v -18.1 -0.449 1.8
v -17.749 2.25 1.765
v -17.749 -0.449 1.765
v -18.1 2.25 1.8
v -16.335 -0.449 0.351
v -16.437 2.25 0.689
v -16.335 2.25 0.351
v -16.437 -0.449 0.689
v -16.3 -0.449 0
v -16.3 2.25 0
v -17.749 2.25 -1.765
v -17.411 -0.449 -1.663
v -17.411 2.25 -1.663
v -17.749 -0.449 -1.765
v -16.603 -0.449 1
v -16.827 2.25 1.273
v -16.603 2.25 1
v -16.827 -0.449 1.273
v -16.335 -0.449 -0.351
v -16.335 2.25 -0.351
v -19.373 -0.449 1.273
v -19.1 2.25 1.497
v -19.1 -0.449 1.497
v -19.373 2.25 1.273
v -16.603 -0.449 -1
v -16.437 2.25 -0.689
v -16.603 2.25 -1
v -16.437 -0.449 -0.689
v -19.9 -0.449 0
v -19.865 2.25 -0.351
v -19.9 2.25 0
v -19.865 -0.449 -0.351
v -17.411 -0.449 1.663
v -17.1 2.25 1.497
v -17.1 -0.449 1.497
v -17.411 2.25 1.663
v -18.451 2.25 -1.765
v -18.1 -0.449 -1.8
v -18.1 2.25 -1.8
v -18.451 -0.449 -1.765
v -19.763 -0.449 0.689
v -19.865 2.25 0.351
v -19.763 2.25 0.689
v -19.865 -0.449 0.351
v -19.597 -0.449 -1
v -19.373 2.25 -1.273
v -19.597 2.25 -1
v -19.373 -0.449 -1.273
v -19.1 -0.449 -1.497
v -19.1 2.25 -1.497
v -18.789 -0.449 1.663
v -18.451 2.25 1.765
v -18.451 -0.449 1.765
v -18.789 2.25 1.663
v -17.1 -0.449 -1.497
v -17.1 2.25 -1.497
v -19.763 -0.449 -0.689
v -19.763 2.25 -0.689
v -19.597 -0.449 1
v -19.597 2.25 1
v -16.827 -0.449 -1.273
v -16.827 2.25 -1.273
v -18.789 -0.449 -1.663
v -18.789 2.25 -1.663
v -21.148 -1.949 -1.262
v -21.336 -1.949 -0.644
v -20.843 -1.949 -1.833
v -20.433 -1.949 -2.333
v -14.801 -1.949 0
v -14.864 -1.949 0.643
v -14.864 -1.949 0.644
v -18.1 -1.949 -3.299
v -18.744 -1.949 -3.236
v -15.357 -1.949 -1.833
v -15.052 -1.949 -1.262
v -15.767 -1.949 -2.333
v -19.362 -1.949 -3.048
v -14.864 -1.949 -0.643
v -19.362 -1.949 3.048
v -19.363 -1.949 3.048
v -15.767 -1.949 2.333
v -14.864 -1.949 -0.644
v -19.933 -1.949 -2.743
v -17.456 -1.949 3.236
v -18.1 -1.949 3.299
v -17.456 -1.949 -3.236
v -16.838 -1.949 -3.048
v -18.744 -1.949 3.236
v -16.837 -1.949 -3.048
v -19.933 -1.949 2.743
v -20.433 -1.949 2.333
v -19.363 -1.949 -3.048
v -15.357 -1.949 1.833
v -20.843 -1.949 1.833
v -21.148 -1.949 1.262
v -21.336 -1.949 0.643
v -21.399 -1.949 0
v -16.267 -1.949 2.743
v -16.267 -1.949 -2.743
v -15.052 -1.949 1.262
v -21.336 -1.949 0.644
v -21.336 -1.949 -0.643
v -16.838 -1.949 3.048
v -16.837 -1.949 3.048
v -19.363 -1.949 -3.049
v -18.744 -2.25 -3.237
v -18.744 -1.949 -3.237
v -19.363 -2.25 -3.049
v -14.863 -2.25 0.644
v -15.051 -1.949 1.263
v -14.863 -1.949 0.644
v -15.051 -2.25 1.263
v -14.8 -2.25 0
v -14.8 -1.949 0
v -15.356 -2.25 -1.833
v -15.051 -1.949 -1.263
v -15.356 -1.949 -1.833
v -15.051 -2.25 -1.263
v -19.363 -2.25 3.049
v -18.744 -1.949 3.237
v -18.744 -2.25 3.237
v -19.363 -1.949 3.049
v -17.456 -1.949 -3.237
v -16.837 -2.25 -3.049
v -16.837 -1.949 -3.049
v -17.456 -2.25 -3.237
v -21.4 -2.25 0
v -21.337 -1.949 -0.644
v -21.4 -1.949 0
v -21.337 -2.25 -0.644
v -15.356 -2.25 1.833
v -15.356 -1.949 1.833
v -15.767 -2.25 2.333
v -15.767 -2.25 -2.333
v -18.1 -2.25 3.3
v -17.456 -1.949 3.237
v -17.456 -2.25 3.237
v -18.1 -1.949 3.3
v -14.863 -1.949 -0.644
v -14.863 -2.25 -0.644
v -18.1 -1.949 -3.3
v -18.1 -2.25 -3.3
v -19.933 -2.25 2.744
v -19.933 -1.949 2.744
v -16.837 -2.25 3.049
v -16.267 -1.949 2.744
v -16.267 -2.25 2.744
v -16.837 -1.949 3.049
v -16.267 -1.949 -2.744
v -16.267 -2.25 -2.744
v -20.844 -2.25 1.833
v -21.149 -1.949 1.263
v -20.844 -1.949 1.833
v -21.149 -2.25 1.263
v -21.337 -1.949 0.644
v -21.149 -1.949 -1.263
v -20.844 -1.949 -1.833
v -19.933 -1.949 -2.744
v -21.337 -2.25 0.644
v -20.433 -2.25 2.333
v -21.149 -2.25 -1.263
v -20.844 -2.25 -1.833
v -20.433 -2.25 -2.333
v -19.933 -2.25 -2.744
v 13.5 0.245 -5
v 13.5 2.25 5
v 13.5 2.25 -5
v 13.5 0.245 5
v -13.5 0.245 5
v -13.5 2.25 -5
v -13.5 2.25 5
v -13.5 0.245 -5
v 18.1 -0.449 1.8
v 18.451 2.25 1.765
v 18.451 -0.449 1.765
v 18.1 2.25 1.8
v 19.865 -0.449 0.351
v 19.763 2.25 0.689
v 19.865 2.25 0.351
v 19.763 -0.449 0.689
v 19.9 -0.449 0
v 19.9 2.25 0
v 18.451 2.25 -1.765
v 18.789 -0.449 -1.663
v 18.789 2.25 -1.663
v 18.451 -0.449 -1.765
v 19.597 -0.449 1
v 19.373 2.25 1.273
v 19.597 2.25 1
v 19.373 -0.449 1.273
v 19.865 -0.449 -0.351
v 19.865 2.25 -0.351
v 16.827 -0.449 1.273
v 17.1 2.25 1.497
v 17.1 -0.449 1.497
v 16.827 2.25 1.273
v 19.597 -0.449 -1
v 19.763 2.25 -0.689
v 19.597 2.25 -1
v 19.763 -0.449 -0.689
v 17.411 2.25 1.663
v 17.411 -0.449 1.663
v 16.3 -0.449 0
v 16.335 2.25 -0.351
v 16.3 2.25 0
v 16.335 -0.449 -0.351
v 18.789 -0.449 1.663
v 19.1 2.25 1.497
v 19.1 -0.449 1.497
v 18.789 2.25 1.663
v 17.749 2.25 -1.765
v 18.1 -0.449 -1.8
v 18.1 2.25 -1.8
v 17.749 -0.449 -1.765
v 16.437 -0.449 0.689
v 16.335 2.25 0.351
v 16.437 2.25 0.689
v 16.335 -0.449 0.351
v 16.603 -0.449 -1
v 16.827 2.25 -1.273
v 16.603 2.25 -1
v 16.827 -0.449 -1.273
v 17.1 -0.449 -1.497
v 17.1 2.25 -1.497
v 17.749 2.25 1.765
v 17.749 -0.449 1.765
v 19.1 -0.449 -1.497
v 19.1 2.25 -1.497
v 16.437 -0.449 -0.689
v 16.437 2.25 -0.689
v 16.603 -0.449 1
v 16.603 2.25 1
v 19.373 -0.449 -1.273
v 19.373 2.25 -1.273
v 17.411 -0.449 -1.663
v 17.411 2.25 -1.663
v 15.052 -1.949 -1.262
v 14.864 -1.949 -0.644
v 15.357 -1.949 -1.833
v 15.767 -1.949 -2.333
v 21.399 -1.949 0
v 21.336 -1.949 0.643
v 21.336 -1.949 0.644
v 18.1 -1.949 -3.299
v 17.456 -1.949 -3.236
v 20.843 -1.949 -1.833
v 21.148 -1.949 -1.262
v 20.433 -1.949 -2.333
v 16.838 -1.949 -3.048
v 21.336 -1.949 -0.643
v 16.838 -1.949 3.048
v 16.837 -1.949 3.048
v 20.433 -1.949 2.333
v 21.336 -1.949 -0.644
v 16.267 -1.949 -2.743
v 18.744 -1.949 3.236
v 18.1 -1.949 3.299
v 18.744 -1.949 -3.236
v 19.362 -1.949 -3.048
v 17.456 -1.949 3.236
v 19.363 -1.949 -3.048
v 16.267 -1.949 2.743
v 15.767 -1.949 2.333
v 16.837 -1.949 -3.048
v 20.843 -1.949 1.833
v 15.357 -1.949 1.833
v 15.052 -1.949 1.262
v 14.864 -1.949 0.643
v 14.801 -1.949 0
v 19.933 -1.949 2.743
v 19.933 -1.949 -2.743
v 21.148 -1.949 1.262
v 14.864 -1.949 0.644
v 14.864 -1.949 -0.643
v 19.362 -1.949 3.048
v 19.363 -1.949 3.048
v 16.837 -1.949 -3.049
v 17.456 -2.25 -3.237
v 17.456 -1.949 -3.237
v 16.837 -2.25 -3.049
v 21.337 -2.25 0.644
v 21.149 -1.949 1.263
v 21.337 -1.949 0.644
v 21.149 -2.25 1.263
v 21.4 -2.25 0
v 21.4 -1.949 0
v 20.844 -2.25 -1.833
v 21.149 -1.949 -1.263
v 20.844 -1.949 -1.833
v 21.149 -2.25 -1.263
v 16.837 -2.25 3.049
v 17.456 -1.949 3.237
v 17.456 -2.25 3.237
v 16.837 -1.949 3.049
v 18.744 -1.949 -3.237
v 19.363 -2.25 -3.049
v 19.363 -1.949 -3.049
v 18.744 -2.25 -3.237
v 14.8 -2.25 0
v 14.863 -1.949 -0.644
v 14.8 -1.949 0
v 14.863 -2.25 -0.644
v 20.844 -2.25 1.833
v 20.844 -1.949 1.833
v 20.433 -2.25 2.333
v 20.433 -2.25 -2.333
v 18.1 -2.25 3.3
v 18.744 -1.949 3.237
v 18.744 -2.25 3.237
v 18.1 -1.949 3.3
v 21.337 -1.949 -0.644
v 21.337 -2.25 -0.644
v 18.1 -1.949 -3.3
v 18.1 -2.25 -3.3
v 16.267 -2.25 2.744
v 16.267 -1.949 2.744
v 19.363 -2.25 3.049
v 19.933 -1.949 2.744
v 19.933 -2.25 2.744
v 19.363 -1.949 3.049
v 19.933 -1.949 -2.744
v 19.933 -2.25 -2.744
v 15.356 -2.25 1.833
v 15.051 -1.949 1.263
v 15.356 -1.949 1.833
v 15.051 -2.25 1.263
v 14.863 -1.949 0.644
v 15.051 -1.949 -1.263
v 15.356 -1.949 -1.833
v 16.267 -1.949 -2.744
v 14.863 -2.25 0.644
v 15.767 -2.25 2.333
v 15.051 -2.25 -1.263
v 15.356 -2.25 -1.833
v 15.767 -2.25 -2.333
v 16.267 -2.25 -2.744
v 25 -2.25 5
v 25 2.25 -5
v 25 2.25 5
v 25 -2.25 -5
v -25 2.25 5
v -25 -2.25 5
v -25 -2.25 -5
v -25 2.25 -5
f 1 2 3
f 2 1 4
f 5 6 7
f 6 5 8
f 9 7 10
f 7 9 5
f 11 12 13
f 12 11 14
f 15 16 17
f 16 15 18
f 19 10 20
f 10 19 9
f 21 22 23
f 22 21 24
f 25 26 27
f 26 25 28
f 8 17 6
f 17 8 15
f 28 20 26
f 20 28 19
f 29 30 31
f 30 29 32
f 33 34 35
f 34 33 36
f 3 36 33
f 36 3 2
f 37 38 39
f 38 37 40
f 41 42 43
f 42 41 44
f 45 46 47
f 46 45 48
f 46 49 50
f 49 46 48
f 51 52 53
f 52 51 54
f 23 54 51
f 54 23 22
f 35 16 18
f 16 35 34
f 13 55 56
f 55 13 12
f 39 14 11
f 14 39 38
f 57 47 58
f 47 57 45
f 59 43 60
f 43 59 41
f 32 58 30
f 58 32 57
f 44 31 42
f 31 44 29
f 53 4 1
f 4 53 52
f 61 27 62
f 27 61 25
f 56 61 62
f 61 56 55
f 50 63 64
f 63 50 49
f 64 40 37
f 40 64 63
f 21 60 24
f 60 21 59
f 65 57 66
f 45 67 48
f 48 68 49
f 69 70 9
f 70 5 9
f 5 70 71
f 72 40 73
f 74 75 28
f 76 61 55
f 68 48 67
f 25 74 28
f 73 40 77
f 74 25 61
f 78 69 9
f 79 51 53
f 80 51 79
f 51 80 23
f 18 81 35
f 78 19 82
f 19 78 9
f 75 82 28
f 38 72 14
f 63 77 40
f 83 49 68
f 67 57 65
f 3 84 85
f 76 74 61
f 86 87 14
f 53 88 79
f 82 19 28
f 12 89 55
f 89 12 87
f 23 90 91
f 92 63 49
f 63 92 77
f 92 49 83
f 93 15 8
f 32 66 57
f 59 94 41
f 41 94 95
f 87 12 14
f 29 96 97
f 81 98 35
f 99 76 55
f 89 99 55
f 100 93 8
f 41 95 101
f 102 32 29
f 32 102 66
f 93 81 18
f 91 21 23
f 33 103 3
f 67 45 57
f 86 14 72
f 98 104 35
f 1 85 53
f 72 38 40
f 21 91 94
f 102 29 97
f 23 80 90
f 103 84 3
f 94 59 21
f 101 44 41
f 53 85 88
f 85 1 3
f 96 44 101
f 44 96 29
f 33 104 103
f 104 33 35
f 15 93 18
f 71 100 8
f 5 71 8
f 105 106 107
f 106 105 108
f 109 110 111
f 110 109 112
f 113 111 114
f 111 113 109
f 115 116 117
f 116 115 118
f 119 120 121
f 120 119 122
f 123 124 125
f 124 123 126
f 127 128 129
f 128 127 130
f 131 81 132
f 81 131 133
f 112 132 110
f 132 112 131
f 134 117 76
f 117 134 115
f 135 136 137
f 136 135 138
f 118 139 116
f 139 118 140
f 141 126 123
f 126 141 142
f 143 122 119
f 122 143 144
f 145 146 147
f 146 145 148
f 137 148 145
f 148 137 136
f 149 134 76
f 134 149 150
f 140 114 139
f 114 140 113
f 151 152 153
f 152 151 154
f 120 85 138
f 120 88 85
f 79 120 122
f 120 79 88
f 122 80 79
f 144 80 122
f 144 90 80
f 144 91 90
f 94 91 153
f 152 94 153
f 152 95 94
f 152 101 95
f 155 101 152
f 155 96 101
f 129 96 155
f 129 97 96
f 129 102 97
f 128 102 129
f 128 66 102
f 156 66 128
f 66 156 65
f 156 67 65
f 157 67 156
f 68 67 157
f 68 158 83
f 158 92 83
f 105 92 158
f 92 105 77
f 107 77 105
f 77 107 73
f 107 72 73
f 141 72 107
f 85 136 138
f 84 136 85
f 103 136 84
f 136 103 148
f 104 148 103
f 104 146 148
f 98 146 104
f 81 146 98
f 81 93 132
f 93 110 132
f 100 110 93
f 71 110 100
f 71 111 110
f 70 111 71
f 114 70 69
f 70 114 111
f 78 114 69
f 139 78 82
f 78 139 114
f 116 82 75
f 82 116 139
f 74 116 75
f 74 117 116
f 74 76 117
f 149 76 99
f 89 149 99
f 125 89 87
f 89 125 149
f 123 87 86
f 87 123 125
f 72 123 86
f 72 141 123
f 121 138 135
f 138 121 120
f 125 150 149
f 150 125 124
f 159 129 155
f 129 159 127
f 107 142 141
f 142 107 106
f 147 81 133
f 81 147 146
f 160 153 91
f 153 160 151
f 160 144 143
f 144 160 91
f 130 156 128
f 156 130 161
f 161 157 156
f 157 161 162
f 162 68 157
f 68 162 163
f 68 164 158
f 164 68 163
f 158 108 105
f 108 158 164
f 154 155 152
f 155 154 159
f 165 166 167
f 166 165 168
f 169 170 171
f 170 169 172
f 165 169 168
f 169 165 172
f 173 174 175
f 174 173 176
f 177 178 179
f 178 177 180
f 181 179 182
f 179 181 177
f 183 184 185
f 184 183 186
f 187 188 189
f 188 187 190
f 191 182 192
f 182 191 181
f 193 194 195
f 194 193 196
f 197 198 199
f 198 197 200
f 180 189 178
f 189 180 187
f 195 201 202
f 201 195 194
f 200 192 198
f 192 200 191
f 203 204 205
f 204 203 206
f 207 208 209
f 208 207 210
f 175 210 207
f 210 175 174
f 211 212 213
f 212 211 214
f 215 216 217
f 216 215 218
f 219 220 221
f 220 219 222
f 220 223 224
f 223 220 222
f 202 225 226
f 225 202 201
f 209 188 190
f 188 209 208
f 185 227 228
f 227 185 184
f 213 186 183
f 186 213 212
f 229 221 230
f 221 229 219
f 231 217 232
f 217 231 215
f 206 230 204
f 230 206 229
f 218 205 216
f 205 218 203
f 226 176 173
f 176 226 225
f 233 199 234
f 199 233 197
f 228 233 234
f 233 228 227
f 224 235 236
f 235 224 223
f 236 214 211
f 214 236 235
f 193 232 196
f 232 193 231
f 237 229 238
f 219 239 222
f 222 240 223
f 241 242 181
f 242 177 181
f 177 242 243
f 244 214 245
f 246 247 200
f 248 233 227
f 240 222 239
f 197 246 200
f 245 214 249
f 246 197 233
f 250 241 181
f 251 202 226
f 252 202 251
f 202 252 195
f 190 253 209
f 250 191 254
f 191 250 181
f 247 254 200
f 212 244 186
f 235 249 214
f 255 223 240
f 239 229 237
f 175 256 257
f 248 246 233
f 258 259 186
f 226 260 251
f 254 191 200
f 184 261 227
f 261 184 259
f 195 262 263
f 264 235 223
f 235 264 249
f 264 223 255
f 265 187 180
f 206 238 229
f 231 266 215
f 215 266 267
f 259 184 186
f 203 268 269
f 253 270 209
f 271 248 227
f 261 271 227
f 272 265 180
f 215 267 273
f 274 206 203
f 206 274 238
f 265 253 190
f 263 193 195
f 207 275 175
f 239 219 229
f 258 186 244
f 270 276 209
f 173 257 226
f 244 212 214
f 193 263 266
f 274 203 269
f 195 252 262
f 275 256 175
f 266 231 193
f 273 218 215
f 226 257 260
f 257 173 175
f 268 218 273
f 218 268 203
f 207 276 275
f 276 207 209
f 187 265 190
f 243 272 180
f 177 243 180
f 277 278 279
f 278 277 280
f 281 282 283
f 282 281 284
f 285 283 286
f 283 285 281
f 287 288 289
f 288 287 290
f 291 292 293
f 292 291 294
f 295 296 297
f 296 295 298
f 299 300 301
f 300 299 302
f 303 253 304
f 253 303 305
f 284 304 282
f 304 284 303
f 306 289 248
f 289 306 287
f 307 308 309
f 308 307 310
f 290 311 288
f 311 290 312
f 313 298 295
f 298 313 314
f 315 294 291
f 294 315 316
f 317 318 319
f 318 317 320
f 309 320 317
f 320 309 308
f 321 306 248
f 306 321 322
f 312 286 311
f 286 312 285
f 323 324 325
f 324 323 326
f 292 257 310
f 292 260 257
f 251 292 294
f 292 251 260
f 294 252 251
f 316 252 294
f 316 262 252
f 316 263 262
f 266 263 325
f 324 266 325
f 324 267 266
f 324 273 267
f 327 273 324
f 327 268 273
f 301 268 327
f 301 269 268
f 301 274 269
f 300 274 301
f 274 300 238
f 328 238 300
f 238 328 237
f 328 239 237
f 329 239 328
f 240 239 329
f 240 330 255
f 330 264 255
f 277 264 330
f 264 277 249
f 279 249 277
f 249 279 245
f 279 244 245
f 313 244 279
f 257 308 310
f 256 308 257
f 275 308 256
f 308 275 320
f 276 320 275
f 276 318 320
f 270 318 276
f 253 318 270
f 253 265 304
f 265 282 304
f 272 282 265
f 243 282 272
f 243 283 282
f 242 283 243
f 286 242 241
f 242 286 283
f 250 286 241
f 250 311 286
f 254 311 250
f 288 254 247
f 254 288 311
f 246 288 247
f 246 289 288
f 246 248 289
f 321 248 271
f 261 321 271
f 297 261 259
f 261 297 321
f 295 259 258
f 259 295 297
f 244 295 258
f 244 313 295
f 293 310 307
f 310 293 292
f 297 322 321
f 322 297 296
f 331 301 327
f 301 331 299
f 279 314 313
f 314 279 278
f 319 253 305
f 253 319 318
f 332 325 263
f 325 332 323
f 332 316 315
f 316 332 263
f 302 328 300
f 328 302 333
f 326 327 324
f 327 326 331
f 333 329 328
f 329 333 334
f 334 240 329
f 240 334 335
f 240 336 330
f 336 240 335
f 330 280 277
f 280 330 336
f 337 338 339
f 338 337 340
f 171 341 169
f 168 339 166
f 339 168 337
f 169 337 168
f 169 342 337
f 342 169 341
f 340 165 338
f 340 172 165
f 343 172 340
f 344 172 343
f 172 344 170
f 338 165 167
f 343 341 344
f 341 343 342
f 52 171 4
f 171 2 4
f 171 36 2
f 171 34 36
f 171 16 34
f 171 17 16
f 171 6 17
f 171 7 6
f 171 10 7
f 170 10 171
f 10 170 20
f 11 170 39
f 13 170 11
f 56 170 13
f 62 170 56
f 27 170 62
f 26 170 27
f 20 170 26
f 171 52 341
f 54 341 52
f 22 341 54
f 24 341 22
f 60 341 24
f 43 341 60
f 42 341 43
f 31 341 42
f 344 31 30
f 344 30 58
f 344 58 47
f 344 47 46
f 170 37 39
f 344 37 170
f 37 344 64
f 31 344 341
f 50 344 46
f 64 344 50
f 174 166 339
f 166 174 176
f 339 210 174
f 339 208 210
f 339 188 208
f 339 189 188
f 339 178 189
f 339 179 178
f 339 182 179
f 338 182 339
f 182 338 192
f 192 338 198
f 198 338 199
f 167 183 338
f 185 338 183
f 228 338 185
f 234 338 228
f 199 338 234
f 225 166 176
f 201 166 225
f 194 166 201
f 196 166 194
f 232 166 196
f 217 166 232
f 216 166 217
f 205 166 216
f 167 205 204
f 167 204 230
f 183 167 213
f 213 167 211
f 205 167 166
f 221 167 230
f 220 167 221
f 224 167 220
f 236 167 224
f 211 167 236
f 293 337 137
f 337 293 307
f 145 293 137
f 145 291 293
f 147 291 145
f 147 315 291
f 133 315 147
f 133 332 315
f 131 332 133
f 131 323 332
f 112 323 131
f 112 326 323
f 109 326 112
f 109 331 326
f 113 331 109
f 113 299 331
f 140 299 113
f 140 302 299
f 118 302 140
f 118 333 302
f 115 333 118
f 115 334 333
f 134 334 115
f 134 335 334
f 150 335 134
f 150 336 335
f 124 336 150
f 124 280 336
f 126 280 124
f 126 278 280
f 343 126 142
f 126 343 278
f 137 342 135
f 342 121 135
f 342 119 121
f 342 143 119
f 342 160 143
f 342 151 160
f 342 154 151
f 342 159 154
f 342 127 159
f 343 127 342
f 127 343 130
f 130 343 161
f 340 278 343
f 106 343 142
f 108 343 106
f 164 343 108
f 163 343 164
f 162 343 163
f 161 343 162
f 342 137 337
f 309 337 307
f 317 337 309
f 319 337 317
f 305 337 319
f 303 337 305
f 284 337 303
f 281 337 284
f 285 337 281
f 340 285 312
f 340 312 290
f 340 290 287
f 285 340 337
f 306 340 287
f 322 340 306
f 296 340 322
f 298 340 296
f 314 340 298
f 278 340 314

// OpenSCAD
/*
hammond_holder.scad

Copyright (C) 2021
Henrik Björkman
www.eit.se/hb

History
2021-07-14 Created by Henrik



box
https://www.elfa.se/Web/Downloads/aw/_e/bk1591A_draw_e.pdf

The 10 mm screws supplied with box need to be replaces with longer, such as these.
Screws, Cross head M3 16mm, philips galvanic
Elfa 301-72-660

*/

dist_between_screws = 36.2;
length = 10;
height = 4.5;
width = 50.0;
band_height = 2;
screw_diam = 3;
band_width = 27.0;
screw_head_height=1.5;
screw_sink=0.3;

difference()
{
    cube([width, height, length], center=true); 

    for(x=[-dist_between_screws/2, dist_between_screws/2])
    {
        translate([x,0,0])
        rotate([90,0,0])
        cylinder(height+0.001, screw_diam/2+0.3, screw_diam/2+0.3, center=true, $fn=32);

        translate([x,-(height/2-screw_sink-screw_head_height/2),0])
        rotate([90,0,0])
        cylinder(screw_head_height+0.001, screw_diam/2+0.3, screw_diam+0.3, center=true, $fn=32);

        translate([x,-(height/2-screw_sink/2),0])
        rotate([90,0,0])
        cylinder(screw_sink+0.001, screw_diam+0.3, screw_diam+0.3, center=true, $fn=32);

        translate([0,(height-band_height)/2,0])
        cube([band_width, band_height+0.01, length+0.01], center=true); 
    }

}
